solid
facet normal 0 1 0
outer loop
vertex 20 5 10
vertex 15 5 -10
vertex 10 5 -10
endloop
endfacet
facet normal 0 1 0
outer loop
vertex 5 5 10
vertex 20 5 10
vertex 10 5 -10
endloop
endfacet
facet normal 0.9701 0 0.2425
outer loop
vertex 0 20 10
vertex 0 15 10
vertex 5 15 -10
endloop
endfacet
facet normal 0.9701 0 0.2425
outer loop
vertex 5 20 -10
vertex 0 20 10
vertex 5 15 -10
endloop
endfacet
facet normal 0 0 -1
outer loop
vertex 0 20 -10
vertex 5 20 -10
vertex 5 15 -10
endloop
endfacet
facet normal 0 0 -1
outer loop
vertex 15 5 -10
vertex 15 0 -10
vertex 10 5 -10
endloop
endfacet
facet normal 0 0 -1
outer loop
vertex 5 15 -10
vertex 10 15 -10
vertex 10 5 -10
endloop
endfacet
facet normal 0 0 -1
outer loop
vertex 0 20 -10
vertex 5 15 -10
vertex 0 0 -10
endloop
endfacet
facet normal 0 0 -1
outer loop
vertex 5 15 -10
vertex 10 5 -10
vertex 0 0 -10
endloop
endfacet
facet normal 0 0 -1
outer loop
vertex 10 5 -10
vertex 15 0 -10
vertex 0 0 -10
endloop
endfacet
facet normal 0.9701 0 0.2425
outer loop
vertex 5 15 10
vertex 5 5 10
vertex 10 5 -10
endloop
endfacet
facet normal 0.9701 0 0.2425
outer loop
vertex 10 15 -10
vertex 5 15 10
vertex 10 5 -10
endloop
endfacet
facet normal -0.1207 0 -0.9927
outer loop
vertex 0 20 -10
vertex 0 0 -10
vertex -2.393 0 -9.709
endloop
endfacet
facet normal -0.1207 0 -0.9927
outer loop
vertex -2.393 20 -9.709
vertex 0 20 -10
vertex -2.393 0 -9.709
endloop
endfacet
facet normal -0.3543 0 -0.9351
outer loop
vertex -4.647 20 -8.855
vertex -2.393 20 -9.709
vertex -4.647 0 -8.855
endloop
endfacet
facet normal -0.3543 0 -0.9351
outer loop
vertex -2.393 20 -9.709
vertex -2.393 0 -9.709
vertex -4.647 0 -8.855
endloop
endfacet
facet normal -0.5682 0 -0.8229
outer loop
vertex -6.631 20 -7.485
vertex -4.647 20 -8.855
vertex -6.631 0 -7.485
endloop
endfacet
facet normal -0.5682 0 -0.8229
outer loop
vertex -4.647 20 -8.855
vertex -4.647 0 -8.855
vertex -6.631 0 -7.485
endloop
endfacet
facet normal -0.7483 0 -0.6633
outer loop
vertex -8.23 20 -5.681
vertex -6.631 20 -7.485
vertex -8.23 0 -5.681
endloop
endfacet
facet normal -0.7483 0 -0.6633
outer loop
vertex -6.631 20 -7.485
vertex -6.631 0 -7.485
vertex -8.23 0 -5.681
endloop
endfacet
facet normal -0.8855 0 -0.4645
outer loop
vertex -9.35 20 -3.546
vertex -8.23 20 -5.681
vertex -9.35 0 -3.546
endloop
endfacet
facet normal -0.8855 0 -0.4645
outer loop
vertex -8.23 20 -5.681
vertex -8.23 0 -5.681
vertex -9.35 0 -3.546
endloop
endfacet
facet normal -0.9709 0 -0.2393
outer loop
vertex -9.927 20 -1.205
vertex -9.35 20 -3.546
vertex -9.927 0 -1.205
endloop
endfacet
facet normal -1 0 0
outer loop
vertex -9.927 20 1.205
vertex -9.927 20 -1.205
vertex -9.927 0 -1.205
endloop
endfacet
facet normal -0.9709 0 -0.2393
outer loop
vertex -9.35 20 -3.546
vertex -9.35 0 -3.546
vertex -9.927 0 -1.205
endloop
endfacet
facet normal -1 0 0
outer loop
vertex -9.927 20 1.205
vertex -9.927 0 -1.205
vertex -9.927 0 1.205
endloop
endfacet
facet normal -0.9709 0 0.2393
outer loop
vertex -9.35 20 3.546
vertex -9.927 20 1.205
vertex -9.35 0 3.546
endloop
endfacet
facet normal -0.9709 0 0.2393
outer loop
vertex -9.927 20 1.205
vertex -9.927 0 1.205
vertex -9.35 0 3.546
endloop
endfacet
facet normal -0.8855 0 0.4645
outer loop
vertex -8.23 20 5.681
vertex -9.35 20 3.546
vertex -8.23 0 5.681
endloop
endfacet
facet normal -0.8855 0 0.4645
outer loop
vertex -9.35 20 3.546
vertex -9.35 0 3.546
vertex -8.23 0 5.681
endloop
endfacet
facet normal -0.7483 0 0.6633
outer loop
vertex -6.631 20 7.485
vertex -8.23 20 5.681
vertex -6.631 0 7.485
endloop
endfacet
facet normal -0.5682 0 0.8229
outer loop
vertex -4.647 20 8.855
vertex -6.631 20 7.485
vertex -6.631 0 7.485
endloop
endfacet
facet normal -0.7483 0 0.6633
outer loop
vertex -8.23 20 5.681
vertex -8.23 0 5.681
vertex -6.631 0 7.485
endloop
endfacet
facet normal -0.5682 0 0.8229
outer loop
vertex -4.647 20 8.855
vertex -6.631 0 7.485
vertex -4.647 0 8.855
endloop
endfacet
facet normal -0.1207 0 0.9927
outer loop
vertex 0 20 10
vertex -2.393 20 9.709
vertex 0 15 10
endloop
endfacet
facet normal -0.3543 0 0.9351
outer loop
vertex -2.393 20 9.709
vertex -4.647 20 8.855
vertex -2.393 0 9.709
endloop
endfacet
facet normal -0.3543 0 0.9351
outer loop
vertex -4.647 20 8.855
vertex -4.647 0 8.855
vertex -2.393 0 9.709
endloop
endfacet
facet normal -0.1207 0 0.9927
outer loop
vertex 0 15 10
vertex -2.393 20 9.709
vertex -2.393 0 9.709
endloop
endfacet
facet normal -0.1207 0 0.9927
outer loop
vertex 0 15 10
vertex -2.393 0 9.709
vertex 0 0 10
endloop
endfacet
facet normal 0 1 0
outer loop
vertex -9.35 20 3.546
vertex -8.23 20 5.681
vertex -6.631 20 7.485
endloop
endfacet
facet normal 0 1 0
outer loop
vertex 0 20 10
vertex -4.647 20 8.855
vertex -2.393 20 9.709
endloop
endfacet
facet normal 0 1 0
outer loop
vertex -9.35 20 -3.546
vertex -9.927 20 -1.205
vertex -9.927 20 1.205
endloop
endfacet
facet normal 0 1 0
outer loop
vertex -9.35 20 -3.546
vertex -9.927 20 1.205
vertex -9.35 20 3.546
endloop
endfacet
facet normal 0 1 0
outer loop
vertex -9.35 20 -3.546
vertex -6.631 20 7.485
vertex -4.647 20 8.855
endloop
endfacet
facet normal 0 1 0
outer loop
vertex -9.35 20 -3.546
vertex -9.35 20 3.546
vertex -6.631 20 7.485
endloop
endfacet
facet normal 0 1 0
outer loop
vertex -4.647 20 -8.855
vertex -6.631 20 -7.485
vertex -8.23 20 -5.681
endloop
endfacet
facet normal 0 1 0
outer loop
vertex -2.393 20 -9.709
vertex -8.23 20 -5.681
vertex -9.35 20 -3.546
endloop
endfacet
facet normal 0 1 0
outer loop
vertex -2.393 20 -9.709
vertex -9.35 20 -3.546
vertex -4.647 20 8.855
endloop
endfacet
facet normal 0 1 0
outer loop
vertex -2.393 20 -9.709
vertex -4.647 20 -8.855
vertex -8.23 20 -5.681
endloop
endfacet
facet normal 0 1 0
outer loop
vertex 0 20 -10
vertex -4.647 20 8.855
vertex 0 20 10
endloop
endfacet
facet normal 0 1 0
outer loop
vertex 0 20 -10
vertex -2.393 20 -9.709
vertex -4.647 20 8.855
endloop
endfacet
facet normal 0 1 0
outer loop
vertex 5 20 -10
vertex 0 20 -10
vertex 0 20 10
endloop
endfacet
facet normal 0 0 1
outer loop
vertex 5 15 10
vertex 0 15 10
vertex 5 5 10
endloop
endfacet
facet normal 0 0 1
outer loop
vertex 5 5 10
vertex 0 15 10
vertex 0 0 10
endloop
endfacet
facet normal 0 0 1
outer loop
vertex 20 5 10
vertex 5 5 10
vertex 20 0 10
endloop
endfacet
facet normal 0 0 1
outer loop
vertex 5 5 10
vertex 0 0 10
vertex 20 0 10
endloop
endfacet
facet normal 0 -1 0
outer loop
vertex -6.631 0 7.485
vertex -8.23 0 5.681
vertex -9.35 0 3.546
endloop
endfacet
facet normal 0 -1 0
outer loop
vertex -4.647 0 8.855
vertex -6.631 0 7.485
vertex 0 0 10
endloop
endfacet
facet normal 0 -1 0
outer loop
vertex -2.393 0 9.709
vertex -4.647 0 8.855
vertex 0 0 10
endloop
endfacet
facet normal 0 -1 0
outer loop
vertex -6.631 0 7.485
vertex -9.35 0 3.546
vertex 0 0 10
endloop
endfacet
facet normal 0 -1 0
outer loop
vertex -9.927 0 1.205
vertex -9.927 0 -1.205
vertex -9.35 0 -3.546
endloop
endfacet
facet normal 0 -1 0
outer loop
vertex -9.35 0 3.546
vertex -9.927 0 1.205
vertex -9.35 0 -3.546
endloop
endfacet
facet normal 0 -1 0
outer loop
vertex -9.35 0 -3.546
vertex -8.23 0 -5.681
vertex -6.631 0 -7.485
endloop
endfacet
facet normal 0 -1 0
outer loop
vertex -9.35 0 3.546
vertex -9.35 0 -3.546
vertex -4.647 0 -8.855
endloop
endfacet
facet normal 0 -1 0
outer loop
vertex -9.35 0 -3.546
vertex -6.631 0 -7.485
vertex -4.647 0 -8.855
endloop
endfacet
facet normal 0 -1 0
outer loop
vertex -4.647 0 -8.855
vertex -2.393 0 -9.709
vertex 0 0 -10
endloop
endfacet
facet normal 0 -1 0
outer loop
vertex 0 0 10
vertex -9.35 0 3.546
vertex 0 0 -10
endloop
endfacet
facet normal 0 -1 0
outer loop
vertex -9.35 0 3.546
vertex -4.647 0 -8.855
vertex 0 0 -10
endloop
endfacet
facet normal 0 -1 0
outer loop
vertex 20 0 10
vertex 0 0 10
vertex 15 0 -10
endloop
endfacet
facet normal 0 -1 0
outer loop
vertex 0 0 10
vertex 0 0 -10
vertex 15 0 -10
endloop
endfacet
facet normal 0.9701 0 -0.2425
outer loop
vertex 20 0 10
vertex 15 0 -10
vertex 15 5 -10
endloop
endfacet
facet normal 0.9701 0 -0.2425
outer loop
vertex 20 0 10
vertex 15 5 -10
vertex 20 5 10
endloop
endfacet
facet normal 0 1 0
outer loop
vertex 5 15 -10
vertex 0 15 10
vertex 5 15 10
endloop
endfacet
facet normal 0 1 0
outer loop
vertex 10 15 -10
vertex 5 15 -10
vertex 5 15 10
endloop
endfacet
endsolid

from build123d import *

# Parameters (mm, degrees)
EXTRUDE_2_DEPTH = 20
EXTRUDE_3_DEPTH = 15
EXTRUDE_4_DEPTH = 5


with BuildPart() as part:
    # 草圖1 → 填料-伸長2 (new body)
    with BuildSketch(Plane(origin=(0, 0, 0), x_dir=(1, 0, 0), z_dir=(0, 1, 0))):
        with BuildLine():
            Line((5, 10), (0, 10))
            ThreePointArc((0, 10), (-10, 0), (0, -10))
            Line((0, -10), (5, 10))
        make_face()
    extrude(amount=EXTRUDE_2_DEPTH)

    # 草圖1<4> → 填料-伸長3 (add)
    with BuildSketch(Plane(origin=(0, 0, 0), x_dir=(1, 0, 0), z_dir=(0, 1, 0))):
        Polygon((5, 10), (0, -10), (5, -10), (10, 10), align=None)
    extrude(amount=EXTRUDE_3_DEPTH)

    # 草圖1<5> → 填料-伸長4 (add)
    with BuildSketch(Plane(origin=(0, 0, 0), x_dir=(1, 0, 0), z_dir=(0, 1, 0))):
        Polygon((10, 10), (5, -10), (20, -10), (15, 10), align=None)
    extrude(amount=EXTRUDE_4_DEPTH)


solid = part.part
